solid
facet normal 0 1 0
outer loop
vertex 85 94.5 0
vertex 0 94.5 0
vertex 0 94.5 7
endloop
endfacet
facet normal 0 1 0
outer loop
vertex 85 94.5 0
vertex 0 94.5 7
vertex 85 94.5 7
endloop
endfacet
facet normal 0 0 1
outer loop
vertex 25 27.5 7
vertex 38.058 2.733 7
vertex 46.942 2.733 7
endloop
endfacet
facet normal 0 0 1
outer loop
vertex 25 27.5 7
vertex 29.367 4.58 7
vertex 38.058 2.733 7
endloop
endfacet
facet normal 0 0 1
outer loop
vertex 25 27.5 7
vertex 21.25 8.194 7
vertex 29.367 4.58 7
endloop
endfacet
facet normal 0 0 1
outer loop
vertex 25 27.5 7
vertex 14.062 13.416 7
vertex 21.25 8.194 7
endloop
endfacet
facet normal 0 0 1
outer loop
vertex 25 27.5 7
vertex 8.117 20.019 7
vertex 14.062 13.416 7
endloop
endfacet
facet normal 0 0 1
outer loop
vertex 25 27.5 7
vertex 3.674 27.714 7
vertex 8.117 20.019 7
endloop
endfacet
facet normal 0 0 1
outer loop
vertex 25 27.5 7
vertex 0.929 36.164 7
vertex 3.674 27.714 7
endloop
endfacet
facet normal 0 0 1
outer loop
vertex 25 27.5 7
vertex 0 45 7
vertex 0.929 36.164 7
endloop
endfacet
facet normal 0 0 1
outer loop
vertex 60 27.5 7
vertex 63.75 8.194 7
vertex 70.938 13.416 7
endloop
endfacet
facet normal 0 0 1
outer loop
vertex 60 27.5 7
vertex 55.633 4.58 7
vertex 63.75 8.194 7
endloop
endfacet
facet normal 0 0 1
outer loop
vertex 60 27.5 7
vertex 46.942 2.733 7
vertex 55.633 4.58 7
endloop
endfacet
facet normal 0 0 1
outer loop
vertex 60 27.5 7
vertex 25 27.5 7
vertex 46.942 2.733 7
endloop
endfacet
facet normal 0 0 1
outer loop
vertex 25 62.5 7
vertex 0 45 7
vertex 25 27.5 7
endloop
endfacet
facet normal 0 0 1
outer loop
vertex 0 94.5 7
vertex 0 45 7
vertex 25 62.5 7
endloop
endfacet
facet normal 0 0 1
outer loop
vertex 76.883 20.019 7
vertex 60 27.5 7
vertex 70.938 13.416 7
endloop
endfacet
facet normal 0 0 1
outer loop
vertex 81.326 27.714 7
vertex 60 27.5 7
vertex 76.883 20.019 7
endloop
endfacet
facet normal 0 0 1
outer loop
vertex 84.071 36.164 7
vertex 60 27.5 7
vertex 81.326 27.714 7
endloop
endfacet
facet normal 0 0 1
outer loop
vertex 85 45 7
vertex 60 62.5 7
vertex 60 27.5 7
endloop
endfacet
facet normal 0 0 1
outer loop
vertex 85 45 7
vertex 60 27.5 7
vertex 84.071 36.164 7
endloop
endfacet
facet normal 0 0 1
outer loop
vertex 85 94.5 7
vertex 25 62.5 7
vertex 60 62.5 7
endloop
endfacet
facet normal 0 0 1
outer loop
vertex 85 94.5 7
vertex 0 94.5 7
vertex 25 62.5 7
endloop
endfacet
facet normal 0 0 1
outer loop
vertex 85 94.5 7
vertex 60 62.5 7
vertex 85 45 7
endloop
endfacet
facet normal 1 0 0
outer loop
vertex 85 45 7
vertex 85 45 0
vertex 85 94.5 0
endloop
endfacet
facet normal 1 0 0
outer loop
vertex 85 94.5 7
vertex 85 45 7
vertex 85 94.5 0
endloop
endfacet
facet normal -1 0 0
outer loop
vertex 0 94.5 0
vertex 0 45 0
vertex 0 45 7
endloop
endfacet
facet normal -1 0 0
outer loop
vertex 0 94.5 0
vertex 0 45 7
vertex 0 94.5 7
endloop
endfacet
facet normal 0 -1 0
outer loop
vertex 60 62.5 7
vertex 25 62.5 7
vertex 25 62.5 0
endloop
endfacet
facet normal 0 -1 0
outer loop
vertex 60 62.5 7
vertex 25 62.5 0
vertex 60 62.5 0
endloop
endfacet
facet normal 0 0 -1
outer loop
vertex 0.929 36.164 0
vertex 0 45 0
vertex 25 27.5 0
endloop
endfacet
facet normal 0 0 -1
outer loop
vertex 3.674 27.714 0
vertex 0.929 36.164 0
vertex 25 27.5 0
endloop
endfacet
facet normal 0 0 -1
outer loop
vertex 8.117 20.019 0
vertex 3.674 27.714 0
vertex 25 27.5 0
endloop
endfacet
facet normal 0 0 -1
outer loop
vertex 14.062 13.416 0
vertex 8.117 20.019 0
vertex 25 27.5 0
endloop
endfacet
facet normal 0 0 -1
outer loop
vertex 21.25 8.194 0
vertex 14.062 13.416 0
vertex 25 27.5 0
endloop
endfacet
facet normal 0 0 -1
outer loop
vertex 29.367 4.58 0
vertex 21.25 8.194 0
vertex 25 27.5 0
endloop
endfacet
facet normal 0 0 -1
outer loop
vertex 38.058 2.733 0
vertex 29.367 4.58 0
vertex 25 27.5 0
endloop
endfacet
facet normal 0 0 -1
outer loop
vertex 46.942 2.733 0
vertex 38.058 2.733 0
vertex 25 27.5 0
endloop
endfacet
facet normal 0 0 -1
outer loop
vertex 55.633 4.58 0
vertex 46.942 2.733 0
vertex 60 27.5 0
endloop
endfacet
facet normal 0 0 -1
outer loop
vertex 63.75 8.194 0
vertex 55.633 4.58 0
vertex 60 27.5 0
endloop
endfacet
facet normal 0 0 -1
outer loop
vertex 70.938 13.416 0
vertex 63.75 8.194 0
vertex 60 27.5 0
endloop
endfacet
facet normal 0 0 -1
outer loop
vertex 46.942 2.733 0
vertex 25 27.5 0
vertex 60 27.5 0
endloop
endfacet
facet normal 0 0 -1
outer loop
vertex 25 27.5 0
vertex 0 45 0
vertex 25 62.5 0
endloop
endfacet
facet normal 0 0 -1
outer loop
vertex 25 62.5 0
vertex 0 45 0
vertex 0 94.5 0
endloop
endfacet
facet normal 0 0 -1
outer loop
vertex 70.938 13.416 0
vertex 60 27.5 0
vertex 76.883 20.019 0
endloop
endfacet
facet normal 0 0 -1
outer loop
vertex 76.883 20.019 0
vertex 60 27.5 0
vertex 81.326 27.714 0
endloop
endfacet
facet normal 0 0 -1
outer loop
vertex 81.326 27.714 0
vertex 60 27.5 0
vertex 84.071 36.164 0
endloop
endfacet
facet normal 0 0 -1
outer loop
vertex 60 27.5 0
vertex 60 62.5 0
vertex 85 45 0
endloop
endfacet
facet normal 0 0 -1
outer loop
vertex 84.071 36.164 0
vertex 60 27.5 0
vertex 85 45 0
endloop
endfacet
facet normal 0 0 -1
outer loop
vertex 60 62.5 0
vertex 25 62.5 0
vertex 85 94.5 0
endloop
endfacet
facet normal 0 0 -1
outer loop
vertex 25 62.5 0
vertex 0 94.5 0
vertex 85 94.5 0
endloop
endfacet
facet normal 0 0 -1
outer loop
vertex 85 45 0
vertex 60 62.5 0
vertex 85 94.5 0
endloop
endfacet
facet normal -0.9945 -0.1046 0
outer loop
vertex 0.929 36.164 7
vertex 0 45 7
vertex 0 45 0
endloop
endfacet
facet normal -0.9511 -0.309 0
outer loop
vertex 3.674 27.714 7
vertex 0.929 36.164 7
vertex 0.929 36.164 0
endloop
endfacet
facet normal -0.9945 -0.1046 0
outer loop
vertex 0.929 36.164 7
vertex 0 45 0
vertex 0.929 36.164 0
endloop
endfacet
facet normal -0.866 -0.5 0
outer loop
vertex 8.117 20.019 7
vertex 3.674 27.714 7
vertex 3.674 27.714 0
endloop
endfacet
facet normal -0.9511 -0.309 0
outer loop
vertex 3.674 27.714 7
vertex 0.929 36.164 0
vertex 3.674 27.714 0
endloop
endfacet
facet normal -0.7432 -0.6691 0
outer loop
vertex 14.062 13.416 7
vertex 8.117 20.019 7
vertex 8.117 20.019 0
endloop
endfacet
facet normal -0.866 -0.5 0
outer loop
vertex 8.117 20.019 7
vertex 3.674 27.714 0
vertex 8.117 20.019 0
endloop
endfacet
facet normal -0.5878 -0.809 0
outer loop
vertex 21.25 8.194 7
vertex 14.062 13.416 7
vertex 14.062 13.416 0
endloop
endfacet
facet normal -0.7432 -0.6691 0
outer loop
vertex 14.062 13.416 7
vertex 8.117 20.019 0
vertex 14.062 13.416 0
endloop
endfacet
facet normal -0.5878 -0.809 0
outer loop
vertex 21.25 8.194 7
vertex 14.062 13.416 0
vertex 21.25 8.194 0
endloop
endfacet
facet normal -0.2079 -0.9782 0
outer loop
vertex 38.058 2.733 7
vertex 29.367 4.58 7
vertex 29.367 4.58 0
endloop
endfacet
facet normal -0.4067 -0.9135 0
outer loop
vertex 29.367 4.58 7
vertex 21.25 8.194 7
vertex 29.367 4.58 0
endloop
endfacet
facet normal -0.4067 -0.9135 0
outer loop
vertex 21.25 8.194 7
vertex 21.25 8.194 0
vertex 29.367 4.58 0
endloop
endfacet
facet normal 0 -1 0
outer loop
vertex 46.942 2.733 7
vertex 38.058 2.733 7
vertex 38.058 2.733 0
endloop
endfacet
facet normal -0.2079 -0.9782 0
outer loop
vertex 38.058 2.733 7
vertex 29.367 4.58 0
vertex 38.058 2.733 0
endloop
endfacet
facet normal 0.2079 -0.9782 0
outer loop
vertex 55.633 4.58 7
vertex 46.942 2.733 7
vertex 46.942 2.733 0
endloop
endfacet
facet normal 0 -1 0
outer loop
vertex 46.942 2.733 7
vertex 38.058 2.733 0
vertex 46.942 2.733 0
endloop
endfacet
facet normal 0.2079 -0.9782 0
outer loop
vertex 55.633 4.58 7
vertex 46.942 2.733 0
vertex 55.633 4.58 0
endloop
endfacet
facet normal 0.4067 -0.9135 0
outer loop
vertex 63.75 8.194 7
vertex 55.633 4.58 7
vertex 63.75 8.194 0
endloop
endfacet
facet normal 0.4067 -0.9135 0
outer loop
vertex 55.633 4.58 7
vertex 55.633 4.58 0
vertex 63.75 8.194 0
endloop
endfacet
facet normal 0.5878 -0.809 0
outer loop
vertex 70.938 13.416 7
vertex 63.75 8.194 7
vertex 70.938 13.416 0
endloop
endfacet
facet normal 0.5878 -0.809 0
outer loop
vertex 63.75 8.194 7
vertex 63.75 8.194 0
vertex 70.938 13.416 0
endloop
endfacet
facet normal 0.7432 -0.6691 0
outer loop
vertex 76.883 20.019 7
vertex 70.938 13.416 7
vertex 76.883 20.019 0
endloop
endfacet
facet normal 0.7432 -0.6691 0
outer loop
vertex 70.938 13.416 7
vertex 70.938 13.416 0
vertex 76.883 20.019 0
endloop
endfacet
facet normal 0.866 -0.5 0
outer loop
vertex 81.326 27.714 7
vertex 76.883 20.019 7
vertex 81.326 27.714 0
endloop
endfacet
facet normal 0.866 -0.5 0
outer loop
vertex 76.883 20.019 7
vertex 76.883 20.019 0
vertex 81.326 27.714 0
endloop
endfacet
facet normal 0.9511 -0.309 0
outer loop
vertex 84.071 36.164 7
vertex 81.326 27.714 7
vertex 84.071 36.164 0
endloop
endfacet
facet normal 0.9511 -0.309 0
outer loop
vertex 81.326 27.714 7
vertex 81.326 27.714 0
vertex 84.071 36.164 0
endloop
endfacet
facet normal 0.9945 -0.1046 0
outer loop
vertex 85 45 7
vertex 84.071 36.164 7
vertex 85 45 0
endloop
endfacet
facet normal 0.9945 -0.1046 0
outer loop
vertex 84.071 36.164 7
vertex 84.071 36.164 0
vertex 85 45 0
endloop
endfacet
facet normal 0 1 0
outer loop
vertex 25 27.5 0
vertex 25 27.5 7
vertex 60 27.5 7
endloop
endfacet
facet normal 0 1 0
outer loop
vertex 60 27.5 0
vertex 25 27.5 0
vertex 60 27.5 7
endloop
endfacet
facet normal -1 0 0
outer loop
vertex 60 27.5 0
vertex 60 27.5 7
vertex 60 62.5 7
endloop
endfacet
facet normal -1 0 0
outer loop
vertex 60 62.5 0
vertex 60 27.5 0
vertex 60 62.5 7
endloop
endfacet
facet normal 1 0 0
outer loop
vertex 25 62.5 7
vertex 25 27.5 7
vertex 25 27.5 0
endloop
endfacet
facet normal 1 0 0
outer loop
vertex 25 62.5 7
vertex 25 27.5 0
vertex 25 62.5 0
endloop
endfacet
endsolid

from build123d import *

# Parameters (mm, degrees)
SKETCH1_W           = 85
SKETCH1_H           = 95
BOSS_EXTRUDE1_DEPTH = 7
SKETCH2_W           = 35
SKETCH2_H           = 35
CUT_EXTRUDE1_DEPTH  = 7
CUT_EXTRUDE4_DEPTH  = 10
SKETCH12_W          = 85
SKETCH12_H          = 7
CUT_EXTRUDE9_DEPTH  = 0.5


with BuildPart() as part:
    # Sketch1 → Boss-Extrude1 (new body)
    with BuildSketch(Plane.XY):
        with Locations((42.5, 47.5)):
            Rectangle(SKETCH1_W, SKETCH1_H)
    extrude(amount=BOSS_EXTRUDE1_DEPTH)

    # Sketch2 → Cut-Extrude1 (cut)
    with BuildSketch(Plane.XY.offset(7)):
        with Locations((42.5, 45)):
            Rectangle(SKETCH2_W, SKETCH2_H)
    extrude(amount=-CUT_EXTRUDE1_DEPTH, mode=Mode.SUBTRACT)

    # Sketch7 → Cut-Extrude4 (cut)
    with BuildSketch(Plane(origin=(0, 0, 0), x_dir=(-1, 0, 0), z_dir=(0, 0, -1))):
        with BuildLine():
            Line((-85, 45), (-85, 0))
            Line((-85, 0), (0, 0))
            Line((0, 0), (0, 45))
            ThreePointArc((0, 45), (-42.5, 2.5), (-85, 45))
        make_face()
    extrude(amount=-CUT_EXTRUDE4_DEPTH, mode=Mode.SUBTRACT)

    # Sketch12 → Cut-Extrude9 (cut)
    with BuildSketch(Plane(origin=(0, 95, 0), x_dir=(1, 0, 0), z_dir=(0, 1, 0))):
        with Locations((42.5, -3.5)):
            Rectangle(SKETCH12_W, SKETCH12_H)
    extrude(amount=-CUT_EXTRUDE9_DEPTH, mode=Mode.SUBTRACT)


solid = part.part
